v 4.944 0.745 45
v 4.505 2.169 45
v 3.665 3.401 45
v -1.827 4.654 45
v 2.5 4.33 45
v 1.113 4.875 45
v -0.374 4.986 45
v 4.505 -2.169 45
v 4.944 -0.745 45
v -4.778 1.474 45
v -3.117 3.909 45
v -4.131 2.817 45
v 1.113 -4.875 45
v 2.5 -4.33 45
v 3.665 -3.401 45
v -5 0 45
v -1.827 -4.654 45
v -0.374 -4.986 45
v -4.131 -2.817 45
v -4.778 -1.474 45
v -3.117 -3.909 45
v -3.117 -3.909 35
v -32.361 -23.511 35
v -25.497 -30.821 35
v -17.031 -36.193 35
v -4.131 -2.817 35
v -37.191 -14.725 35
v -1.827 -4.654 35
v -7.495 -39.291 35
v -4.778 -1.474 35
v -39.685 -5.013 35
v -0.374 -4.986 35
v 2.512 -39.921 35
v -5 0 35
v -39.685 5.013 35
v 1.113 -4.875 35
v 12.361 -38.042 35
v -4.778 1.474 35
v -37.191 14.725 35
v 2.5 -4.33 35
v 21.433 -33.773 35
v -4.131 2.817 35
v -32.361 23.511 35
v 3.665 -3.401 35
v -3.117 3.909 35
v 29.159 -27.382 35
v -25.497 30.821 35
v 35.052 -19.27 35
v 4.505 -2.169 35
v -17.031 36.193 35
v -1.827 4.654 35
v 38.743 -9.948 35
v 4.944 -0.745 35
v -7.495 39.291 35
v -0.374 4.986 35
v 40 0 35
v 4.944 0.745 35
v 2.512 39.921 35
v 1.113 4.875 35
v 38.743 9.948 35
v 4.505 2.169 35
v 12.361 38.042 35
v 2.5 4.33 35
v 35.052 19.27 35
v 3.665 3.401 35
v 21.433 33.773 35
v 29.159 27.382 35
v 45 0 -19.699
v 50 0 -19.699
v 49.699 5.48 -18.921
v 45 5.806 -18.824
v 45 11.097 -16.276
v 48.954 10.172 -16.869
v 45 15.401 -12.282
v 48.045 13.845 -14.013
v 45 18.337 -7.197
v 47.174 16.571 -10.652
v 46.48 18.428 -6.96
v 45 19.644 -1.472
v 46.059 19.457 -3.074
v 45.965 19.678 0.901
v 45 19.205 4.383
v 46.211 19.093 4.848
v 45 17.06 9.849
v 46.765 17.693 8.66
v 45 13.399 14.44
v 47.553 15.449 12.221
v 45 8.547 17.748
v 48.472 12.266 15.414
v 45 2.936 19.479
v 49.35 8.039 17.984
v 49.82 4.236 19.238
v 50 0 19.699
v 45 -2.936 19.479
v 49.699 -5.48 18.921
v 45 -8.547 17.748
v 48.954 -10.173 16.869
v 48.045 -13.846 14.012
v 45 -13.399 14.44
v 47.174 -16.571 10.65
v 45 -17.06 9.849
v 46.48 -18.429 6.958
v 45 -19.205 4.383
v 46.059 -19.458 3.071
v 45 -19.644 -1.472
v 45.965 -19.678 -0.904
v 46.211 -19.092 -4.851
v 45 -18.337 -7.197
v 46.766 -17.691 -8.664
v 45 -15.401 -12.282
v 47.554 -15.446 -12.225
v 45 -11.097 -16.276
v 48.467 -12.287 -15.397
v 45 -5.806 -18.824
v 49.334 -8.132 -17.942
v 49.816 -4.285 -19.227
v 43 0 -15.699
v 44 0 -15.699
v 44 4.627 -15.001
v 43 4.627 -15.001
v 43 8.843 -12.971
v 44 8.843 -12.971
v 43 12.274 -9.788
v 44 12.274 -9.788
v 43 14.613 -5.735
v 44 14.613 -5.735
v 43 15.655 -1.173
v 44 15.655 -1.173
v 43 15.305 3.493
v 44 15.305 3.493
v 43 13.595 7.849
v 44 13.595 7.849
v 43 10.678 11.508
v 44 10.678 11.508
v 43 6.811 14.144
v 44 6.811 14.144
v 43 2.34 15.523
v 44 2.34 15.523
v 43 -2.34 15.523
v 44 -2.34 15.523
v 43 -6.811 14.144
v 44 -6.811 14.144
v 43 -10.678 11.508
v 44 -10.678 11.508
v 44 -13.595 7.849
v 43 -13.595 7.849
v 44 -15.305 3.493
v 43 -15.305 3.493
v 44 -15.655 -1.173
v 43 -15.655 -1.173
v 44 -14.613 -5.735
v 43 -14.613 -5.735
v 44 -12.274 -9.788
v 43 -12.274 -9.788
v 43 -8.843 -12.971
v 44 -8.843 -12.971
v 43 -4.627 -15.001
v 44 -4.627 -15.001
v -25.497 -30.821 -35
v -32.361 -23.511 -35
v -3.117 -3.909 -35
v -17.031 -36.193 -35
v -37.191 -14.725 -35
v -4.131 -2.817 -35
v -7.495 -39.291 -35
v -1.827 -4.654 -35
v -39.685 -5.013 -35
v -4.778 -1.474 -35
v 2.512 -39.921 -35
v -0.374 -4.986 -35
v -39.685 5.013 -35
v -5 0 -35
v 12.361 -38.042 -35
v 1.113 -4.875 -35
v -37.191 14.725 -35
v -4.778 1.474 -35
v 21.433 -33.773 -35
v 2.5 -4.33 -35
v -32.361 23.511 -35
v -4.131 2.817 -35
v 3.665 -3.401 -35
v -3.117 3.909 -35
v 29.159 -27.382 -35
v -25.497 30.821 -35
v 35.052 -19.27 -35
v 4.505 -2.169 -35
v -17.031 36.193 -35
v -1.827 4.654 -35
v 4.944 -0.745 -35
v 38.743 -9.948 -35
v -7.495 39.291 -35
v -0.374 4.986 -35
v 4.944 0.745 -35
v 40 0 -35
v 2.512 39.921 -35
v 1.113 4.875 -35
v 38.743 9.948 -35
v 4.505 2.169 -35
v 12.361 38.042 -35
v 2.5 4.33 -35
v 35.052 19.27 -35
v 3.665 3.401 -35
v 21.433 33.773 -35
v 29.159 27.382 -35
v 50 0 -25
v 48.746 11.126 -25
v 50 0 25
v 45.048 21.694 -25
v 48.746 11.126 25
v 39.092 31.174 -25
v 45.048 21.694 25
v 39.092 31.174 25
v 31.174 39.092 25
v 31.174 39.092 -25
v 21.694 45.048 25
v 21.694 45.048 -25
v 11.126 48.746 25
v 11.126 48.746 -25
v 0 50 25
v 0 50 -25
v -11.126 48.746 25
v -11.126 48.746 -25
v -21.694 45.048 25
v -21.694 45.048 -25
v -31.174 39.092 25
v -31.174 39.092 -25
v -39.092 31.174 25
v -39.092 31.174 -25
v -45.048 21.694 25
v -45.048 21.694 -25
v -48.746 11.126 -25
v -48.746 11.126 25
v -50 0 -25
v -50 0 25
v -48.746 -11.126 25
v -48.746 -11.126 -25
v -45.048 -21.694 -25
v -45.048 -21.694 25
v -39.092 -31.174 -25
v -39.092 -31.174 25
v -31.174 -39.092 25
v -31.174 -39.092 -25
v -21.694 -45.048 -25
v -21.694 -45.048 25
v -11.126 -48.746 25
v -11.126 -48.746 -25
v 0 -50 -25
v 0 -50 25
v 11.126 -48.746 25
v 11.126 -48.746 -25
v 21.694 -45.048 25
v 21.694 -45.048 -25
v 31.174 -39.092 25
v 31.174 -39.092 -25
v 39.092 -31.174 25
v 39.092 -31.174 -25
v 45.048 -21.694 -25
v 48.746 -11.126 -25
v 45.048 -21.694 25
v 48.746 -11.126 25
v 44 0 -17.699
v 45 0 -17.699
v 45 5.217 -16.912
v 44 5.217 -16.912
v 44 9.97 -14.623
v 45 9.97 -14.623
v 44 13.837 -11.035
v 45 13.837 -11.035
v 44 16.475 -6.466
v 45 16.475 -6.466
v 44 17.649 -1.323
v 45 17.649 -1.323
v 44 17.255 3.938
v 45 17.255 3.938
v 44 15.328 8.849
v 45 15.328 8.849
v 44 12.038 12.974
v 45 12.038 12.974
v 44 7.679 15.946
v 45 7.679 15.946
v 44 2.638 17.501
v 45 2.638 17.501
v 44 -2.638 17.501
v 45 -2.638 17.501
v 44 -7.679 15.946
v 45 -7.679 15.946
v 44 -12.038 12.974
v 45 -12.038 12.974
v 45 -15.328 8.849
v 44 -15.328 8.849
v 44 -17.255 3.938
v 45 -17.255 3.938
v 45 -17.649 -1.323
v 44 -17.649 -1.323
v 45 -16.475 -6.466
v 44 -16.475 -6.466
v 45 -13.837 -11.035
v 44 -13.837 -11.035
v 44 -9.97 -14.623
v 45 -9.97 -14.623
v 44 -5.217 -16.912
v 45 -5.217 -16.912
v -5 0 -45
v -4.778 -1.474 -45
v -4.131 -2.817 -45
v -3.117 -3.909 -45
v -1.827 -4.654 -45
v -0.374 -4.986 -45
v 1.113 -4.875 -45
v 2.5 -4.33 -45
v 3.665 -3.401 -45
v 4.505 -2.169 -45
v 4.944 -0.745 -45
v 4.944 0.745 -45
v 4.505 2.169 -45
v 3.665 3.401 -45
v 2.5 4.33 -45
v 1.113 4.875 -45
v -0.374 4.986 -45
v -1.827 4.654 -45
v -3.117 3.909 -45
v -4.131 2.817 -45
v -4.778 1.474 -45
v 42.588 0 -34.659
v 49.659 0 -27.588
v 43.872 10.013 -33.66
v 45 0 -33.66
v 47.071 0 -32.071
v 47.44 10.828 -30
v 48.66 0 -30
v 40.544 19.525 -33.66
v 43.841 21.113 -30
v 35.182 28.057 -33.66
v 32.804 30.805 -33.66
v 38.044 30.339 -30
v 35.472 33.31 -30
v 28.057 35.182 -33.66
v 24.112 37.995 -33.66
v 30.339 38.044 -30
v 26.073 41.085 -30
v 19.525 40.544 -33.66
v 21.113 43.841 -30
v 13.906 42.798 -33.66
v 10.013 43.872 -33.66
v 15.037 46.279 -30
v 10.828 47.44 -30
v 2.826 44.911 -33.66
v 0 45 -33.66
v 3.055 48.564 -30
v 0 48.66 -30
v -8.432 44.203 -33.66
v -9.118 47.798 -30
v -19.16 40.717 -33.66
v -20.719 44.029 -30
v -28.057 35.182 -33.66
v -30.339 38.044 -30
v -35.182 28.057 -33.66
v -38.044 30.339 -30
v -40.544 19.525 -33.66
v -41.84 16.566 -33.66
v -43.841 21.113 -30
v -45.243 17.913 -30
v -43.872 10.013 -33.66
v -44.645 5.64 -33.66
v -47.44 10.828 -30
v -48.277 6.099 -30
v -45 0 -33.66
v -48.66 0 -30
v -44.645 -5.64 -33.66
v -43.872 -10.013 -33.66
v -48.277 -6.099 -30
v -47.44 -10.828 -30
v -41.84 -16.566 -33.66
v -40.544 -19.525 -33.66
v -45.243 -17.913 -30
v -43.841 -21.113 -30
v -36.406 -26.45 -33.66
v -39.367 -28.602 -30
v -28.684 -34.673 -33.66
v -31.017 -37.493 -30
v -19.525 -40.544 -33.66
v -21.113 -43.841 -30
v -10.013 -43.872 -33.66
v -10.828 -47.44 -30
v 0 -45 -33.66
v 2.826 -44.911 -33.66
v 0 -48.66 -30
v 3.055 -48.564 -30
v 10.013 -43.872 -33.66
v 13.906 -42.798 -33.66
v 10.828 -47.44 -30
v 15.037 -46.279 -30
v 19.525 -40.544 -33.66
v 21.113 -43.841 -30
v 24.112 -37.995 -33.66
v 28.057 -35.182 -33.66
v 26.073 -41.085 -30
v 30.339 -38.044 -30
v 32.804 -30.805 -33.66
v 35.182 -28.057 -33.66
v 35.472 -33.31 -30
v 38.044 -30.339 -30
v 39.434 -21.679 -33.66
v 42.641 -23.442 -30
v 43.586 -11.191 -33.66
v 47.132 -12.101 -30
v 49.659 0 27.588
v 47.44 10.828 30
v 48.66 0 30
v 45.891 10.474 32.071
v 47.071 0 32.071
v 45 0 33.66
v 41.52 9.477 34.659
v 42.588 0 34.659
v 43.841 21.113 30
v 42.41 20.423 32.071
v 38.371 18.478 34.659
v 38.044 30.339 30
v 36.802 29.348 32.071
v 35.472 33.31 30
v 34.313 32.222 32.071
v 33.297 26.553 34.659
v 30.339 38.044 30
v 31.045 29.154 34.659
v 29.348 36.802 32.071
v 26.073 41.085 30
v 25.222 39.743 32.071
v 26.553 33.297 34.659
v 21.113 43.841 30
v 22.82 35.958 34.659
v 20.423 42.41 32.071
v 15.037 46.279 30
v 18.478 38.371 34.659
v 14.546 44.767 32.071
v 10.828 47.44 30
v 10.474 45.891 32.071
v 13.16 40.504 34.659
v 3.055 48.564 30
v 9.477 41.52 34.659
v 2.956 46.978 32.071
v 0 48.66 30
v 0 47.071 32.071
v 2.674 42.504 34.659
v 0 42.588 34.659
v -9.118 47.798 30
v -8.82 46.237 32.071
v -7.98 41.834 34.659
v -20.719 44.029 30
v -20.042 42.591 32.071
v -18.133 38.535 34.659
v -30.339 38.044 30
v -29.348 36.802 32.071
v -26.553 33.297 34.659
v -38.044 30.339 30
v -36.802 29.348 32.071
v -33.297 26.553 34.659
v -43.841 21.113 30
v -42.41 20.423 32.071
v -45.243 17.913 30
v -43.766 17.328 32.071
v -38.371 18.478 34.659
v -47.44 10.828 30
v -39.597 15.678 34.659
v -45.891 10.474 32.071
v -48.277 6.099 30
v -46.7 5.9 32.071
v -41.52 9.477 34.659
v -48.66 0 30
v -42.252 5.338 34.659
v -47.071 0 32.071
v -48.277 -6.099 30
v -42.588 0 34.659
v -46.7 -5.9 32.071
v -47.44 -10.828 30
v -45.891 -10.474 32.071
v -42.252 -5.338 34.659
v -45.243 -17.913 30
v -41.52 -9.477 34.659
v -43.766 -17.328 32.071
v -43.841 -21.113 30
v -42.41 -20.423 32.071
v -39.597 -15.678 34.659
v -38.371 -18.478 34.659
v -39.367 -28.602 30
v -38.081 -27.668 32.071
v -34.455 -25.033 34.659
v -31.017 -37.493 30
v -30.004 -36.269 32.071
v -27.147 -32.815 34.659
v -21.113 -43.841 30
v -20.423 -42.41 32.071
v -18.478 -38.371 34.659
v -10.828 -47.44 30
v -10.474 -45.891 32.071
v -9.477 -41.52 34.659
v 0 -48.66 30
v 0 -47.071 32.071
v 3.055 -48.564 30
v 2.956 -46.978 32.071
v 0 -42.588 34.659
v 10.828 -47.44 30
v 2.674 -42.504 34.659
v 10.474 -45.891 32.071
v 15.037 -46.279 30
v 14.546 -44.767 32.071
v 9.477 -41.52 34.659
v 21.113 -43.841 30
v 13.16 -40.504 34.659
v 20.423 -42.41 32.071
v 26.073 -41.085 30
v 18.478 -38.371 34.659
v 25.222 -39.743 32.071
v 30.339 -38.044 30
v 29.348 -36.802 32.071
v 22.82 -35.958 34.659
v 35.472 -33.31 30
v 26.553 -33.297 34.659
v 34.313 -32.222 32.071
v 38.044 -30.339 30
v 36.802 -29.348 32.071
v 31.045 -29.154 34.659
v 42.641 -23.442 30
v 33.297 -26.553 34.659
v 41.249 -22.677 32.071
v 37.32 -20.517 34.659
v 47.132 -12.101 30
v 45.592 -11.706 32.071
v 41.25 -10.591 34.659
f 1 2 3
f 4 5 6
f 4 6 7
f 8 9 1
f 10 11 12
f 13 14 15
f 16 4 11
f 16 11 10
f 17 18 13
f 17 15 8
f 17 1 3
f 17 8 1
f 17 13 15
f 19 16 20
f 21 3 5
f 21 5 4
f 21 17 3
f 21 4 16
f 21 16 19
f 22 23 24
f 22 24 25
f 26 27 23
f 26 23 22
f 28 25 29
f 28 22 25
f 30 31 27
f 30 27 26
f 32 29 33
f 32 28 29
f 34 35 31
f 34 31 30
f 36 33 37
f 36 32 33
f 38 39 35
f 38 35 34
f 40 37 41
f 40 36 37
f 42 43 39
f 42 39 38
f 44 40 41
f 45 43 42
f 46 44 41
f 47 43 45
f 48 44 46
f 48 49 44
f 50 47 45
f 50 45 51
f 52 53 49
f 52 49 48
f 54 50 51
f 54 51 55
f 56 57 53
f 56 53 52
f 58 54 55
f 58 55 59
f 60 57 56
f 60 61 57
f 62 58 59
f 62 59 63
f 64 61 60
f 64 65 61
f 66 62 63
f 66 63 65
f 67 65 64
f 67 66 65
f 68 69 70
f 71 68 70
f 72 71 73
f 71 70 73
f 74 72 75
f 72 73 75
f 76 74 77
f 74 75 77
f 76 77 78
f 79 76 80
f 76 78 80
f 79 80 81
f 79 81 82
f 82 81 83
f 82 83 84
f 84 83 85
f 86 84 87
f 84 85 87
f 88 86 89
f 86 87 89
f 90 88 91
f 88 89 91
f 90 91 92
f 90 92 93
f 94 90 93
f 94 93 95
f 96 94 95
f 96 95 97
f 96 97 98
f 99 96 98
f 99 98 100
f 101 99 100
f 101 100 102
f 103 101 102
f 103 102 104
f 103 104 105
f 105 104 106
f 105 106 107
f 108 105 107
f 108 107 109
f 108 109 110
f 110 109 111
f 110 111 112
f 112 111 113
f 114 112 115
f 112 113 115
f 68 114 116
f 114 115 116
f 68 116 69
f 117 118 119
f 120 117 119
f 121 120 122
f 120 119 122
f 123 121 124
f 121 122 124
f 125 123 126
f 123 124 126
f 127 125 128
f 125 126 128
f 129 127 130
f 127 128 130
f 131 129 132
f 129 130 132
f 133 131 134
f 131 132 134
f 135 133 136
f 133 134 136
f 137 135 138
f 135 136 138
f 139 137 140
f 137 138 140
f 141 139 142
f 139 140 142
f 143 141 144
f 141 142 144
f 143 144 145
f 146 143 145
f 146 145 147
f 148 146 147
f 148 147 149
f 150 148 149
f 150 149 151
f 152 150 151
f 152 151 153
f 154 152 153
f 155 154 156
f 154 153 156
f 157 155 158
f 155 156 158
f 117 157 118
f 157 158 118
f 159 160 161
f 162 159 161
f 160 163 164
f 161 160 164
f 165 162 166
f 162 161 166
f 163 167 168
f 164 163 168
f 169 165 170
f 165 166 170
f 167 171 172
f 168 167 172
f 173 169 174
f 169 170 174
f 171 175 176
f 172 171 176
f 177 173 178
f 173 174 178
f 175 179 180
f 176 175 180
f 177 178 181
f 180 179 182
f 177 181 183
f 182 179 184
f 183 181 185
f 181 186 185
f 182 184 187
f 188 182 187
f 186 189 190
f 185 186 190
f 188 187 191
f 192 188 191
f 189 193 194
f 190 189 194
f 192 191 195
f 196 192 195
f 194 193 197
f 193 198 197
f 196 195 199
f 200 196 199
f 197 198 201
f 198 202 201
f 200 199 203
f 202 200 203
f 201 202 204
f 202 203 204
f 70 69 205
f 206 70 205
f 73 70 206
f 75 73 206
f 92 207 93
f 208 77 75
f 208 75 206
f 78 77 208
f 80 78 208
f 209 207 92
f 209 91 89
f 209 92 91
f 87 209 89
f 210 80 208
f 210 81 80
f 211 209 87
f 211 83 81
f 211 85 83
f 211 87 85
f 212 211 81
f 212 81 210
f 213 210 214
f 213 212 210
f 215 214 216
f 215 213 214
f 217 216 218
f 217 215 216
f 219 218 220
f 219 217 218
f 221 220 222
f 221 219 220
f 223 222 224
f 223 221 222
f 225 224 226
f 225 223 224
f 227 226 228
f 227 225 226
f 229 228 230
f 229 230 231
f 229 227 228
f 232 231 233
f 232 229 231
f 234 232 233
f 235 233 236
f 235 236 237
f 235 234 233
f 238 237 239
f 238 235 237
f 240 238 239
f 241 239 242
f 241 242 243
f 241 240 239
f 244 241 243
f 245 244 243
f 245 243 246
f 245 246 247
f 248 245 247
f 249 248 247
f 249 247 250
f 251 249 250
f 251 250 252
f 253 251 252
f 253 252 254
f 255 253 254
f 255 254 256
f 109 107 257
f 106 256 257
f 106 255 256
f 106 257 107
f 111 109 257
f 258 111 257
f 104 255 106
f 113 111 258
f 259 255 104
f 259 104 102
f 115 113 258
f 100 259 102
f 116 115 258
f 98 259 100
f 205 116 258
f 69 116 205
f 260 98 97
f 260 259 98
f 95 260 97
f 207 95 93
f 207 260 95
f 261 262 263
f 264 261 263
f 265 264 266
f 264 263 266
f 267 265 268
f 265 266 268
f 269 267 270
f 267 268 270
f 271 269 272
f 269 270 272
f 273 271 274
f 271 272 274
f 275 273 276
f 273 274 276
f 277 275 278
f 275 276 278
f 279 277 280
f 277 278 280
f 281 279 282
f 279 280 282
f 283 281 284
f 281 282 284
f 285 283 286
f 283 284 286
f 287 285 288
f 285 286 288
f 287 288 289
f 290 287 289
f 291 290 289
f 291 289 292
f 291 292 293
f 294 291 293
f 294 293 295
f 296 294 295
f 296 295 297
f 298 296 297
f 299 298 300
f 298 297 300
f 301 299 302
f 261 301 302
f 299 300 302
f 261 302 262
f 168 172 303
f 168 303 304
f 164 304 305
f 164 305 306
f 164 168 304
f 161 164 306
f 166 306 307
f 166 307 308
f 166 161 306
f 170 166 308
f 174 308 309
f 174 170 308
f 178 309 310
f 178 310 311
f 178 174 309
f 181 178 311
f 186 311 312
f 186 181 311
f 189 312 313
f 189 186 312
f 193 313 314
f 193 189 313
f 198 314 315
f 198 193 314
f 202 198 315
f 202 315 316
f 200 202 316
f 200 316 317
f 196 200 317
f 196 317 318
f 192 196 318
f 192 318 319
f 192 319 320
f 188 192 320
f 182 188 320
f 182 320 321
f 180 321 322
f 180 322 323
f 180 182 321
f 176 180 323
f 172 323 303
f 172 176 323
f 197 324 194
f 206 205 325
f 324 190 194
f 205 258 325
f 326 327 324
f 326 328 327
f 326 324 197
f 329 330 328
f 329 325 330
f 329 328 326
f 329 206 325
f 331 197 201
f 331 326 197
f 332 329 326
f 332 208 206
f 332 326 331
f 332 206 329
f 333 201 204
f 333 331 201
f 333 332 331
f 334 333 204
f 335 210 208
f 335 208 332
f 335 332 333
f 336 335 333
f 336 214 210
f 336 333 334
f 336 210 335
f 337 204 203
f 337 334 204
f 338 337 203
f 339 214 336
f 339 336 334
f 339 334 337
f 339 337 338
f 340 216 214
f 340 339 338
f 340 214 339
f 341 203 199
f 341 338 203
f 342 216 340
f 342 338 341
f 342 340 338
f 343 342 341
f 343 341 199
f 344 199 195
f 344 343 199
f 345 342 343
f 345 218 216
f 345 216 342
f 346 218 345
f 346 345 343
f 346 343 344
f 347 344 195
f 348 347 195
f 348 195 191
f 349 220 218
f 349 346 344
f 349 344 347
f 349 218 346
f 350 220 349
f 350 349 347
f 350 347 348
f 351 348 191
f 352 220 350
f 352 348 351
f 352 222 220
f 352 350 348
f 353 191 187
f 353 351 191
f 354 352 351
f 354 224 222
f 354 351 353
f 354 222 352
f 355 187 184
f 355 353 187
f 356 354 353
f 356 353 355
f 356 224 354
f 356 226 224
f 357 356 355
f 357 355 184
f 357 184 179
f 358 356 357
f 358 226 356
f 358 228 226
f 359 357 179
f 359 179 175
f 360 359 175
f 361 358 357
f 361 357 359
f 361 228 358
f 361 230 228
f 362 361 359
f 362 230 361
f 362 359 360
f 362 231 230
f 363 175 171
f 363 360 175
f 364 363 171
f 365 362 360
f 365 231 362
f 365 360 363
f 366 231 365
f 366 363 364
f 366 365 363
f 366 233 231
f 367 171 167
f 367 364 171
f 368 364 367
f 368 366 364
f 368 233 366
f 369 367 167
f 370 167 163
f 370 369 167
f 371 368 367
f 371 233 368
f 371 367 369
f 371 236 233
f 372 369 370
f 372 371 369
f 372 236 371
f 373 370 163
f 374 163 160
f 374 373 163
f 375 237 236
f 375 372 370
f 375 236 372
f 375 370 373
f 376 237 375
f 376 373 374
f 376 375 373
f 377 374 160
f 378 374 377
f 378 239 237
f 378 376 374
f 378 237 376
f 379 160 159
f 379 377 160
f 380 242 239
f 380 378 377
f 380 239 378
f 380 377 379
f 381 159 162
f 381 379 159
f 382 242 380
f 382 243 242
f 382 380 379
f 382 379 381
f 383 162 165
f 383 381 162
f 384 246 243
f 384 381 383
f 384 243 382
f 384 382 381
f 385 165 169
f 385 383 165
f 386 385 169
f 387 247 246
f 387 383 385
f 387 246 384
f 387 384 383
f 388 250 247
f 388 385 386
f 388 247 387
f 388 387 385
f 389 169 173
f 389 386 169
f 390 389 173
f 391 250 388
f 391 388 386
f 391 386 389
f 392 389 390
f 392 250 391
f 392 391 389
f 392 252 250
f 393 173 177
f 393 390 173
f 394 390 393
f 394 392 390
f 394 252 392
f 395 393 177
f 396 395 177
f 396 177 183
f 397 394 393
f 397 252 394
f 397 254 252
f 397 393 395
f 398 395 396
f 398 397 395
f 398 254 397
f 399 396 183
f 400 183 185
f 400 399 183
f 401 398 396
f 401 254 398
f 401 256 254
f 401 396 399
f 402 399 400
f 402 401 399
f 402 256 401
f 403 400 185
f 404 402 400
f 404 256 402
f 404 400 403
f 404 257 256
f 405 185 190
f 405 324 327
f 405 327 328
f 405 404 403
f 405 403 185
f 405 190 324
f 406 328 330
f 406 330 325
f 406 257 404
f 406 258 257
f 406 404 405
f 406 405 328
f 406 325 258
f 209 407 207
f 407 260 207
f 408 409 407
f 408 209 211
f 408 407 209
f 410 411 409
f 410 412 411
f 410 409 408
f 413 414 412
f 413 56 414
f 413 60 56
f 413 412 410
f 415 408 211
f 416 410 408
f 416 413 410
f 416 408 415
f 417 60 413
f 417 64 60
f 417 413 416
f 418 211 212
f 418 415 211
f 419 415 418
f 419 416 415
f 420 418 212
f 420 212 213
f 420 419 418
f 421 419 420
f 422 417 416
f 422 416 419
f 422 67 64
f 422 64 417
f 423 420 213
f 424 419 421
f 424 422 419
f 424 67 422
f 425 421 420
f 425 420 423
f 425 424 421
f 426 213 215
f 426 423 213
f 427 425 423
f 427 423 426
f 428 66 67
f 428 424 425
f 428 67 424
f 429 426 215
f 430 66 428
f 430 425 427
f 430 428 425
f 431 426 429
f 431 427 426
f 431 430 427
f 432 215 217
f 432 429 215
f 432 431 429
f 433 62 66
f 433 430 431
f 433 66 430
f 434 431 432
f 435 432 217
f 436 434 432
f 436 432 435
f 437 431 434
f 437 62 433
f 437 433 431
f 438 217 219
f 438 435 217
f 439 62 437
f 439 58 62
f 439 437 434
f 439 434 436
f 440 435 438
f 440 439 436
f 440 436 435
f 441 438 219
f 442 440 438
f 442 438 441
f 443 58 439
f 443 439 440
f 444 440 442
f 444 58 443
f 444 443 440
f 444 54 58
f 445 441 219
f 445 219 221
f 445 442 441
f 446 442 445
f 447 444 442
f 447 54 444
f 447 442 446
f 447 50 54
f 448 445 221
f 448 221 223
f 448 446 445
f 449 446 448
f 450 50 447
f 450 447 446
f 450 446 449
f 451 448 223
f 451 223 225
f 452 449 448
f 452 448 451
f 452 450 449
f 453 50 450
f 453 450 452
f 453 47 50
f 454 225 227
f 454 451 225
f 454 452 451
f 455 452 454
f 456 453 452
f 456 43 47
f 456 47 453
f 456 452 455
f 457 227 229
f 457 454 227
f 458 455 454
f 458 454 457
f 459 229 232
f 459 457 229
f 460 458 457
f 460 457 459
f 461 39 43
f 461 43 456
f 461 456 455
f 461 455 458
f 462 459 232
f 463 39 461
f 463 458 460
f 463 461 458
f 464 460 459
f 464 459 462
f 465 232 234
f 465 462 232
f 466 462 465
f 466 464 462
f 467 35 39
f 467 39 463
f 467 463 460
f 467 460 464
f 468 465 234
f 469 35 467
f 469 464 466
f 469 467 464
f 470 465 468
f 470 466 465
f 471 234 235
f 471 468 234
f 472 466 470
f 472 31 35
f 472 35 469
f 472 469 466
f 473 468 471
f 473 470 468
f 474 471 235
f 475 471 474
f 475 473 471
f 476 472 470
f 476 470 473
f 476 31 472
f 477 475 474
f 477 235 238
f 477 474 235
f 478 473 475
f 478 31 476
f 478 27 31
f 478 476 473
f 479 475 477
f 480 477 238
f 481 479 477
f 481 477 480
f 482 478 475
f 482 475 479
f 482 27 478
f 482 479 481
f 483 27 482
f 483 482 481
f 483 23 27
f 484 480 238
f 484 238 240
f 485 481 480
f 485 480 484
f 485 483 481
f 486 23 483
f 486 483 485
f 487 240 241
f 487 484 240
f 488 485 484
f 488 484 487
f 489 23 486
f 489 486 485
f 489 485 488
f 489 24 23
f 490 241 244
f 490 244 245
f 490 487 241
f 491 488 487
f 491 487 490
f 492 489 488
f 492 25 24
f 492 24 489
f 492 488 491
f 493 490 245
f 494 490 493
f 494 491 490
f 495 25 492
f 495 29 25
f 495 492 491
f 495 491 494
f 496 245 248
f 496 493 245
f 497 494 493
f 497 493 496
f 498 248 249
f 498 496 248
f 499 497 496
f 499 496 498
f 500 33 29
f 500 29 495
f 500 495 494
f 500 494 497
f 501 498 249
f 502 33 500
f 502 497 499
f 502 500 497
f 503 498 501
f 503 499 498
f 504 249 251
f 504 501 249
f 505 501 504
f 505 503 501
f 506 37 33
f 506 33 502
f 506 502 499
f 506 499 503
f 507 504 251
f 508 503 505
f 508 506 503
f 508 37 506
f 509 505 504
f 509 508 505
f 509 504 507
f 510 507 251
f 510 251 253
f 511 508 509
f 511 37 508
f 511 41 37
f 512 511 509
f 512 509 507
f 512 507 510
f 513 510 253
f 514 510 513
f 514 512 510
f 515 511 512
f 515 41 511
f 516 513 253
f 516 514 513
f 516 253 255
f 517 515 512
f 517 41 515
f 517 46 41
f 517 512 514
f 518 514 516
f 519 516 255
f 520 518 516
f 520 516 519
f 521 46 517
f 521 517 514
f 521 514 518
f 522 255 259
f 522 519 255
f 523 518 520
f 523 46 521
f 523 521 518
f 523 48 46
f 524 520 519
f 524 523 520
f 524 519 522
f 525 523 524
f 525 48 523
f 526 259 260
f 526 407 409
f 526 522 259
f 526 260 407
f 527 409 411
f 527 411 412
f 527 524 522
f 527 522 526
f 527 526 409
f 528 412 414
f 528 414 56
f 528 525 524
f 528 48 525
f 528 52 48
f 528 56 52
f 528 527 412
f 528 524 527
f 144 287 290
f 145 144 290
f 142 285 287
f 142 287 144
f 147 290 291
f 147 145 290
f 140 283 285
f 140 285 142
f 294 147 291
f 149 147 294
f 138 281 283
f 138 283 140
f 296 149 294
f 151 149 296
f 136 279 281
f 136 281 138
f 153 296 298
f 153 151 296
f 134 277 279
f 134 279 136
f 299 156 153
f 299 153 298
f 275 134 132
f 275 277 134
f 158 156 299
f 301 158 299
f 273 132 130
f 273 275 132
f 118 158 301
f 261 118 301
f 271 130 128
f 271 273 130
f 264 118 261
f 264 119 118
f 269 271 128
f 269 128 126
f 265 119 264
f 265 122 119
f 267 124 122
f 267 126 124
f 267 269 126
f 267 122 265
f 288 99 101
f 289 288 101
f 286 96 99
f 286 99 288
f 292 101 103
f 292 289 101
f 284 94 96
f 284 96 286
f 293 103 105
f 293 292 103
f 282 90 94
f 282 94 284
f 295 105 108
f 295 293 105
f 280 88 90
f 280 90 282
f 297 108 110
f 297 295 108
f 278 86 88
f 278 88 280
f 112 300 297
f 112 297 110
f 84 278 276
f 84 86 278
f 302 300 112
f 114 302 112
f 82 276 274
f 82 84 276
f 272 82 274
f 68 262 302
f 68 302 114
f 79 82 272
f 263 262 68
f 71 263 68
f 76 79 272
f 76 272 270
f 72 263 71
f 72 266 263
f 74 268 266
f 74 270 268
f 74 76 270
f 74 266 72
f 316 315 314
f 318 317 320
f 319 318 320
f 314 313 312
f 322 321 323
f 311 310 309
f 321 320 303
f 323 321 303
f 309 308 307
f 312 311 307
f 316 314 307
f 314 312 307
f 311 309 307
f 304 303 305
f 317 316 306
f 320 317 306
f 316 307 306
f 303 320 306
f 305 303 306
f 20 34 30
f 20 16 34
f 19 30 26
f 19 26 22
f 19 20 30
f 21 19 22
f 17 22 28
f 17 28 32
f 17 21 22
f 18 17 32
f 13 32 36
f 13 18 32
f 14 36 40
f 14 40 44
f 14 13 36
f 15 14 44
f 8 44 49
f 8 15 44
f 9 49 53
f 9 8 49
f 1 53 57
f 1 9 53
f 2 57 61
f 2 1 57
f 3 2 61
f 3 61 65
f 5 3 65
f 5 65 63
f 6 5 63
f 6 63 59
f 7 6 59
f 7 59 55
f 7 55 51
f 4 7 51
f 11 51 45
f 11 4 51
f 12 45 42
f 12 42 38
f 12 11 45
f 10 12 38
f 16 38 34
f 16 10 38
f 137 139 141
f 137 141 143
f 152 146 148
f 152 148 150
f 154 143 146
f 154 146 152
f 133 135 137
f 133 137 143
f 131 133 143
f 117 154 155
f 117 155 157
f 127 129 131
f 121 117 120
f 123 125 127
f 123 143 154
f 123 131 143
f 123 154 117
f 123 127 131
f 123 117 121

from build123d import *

# Parameters (mm, degrees)
SKETCH1_R           = 50
BOSS_EXTRUDE1_DEPTH = 35
SKETCH2_R           = 5
BOSS_EXTRUDE2_DEPTH = 45
FILLET1_R           = 10
SKETCH3_R           = 19.698674941
CUT_EXTRUDE1_DEPTH  = 5
SKETCH4_R           = 17.698674941
CUT_EXTRUDE2_DEPTH  = 1
SKETCH5_R           = 15.698674941
CUT_EXTRUDE3_DEPTH  = 1


with BuildPart() as part:
    # Sketch1 → Boss-Extrude1 (new, symmetric)
    with BuildSketch(Plane.XY):
        Circle(SKETCH1_R)
    extrude(amount=BOSS_EXTRUDE1_DEPTH, both=True)

    # Sketch2 → Boss-Extrude2 (add, symmetric)
    with BuildSketch(Plane.XY):
        with Locations(Location((0, 0, 0), (0, 0, 180))):
            Circle(SKETCH2_R)
    extrude(amount=BOSS_EXTRUDE2_DEPTH, both=True)

    # Fillet1
    fillet1_edges = [part.edges().sort_by_distance(p)[0] for p in [
        (-50, 0, -35),
        (-50, 0, 35),
    ]]
    fillet(fillet1_edges, radius=FILLET1_R)

    # Sketch3 → Cut-Extrude1 (cut)
    with BuildSketch(Plane(origin=(50, 0, 0), x_dir=(0, 0, -1), z_dir=(1, 0, 0))):
        Circle(SKETCH3_R)
    extrude(amount=-CUT_EXTRUDE1_DEPTH, mode=Mode.SUBTRACT)

    # Sketch4 → Cut-Extrude2 (cut)
    with BuildSketch(Plane(origin=(45, 0, 0), x_dir=(0, 0, -1), z_dir=(1, 0, 0))):
        Circle(SKETCH4_R)
    extrude(amount=-CUT_EXTRUDE2_DEPTH, mode=Mode.SUBTRACT)

    # Sketch5 → Cut-Extrude3 (cut)
    with BuildSketch(Plane(origin=(44, 0, 0), x_dir=(0, 0, -1), z_dir=(1, 0, 0))):
        Circle(SKETCH5_R)
    extrude(amount=-CUT_EXTRUDE3_DEPTH, mode=Mode.SUBTRACT)


solid = part.part
